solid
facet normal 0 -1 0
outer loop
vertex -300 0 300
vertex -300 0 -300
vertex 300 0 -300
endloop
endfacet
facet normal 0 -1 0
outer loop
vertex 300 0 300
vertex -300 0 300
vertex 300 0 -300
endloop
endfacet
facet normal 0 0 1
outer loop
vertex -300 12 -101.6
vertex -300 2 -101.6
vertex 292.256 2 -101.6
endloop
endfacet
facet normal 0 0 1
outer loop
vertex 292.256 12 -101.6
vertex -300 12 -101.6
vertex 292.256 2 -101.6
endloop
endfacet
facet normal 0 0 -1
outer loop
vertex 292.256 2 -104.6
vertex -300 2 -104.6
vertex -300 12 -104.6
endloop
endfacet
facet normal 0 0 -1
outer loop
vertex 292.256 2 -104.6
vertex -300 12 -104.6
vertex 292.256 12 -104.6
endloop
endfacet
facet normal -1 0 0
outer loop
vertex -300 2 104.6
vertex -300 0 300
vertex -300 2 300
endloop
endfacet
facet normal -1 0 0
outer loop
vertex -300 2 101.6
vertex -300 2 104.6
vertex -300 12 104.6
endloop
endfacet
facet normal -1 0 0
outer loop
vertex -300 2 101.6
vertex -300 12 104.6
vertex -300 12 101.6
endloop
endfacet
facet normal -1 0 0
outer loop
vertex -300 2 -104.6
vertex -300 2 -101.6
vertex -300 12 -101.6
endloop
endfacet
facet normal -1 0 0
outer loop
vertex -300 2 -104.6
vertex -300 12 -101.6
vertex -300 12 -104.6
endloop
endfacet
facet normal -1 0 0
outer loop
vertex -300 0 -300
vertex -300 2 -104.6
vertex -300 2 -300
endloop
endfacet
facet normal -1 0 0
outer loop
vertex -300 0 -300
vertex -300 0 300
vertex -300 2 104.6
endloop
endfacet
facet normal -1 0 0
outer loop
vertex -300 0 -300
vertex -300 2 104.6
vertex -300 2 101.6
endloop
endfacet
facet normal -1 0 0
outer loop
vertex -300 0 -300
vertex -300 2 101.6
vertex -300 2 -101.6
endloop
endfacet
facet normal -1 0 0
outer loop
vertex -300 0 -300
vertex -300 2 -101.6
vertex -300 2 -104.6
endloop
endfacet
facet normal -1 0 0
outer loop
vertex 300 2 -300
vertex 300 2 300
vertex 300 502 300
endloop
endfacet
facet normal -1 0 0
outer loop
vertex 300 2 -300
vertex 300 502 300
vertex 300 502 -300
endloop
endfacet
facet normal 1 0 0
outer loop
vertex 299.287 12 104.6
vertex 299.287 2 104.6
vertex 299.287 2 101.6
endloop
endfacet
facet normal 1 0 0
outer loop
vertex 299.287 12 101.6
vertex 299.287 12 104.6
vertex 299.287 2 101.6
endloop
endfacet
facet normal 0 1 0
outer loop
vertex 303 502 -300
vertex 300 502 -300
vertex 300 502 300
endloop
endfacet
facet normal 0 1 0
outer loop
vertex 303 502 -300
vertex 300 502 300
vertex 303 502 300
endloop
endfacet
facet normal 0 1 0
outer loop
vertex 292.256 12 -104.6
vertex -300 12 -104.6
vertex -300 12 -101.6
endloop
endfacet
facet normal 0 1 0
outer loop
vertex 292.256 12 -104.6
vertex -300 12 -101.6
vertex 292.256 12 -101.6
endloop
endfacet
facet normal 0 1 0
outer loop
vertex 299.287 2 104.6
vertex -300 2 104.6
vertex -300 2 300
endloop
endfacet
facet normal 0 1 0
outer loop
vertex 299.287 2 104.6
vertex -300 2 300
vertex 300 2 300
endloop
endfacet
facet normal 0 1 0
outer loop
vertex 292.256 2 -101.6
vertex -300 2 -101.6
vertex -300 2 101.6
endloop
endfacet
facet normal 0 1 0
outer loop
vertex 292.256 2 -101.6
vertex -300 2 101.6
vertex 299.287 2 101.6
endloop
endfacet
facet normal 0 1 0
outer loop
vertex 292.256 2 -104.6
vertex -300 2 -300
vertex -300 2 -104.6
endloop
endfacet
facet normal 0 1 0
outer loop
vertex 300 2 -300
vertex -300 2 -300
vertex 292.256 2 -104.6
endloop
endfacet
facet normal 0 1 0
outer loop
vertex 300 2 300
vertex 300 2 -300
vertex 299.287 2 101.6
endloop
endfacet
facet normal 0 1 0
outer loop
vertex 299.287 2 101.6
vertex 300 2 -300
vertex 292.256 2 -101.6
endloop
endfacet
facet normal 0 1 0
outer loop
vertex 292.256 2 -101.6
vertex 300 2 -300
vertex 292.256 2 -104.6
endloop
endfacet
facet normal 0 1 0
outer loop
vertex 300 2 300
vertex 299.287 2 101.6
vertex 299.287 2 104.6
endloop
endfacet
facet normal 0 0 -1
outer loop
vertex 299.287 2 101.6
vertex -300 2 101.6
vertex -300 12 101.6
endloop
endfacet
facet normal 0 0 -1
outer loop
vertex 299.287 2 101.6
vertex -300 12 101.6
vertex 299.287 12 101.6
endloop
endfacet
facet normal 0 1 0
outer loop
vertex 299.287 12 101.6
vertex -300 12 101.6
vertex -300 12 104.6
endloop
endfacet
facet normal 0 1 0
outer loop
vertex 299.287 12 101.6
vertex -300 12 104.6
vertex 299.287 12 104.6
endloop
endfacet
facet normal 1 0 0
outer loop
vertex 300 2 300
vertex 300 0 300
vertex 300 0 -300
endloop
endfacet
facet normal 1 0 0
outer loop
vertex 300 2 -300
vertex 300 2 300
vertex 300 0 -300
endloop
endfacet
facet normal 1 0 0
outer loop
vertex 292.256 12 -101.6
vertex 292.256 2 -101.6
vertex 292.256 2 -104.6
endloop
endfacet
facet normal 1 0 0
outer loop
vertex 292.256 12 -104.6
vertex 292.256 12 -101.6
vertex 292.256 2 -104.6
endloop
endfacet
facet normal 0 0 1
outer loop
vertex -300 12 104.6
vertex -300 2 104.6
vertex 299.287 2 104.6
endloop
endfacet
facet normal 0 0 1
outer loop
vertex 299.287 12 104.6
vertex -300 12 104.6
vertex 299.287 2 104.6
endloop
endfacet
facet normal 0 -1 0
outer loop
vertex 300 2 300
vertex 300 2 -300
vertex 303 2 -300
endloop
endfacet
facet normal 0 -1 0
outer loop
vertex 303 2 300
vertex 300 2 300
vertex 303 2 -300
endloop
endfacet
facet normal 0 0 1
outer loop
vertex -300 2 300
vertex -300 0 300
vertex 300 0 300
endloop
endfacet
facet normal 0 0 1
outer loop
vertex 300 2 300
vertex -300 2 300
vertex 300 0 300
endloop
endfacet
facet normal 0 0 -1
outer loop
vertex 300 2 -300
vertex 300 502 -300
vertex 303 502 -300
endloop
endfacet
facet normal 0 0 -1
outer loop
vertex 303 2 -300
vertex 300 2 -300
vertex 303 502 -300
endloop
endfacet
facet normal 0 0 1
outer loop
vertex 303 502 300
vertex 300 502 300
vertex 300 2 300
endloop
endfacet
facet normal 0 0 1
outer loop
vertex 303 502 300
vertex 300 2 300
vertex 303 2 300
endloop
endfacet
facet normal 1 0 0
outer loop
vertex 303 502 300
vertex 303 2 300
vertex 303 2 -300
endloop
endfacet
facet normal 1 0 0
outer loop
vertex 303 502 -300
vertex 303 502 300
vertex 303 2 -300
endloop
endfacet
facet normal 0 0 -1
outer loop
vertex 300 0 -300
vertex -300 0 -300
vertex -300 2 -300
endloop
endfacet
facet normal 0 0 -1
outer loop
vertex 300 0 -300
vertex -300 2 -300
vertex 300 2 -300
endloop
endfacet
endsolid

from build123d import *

# Parameters (mm, degrees)
SKETCH_1_W      = 600
SKETCH_1_H      = 600
EXTRUDE_1_DEPTH = 2
SKETCH_2_W      = 3
SKETCH_2_H      = 600
EXTRUDE_2_DEPTH = 500
SKETCH_4_W      = 592.256000526
SKETCH_4_H      = 3
SKETCH_4_W_2    = 599.287070966
EXTRUDE_6_DEPTH = 10


with BuildPart() as part:
    # 草图1 → 凸台-拉伸1 (new body)
    with BuildSketch(Plane(origin=(0, 0, 0), x_dir=(1, 0, 0), z_dir=(0, 1, 0))):
        Rectangle(SKETCH_1_W, SKETCH_1_H)
    extrude(amount=EXTRUDE_1_DEPTH)

    # 草图4 → 凸台-拉伸6 (add)
    with BuildSketch(Plane(origin=(0, 2, 0), x_dir=(1, 0, 0), z_dir=(0, 1, 0))):
        with Locations((-3.871999737, 103.1)):
            Rectangle(SKETCH_4_W, SKETCH_4_H)
        with Locations((-0.356464517, -103.1)):
            Rectangle(SKETCH_4_W_2, SKETCH_4_H)
    extrude(amount=EXTRUDE_6_DEPTH)


with BuildPart() as body_2:
    # 草图2 → 凸台-拉伸2 (new body)
    with BuildSketch(Plane(origin=(0, 2, 0), x_dir=(1, 0, 0), z_dir=(0, 1, 0))):
        with Locations((301.5, 0)):
            Rectangle(SKETCH_2_W, SKETCH_2_H)
    extrude(amount=EXTRUDE_2_DEPTH)


solid = Compound([part.part, body_2.part])
